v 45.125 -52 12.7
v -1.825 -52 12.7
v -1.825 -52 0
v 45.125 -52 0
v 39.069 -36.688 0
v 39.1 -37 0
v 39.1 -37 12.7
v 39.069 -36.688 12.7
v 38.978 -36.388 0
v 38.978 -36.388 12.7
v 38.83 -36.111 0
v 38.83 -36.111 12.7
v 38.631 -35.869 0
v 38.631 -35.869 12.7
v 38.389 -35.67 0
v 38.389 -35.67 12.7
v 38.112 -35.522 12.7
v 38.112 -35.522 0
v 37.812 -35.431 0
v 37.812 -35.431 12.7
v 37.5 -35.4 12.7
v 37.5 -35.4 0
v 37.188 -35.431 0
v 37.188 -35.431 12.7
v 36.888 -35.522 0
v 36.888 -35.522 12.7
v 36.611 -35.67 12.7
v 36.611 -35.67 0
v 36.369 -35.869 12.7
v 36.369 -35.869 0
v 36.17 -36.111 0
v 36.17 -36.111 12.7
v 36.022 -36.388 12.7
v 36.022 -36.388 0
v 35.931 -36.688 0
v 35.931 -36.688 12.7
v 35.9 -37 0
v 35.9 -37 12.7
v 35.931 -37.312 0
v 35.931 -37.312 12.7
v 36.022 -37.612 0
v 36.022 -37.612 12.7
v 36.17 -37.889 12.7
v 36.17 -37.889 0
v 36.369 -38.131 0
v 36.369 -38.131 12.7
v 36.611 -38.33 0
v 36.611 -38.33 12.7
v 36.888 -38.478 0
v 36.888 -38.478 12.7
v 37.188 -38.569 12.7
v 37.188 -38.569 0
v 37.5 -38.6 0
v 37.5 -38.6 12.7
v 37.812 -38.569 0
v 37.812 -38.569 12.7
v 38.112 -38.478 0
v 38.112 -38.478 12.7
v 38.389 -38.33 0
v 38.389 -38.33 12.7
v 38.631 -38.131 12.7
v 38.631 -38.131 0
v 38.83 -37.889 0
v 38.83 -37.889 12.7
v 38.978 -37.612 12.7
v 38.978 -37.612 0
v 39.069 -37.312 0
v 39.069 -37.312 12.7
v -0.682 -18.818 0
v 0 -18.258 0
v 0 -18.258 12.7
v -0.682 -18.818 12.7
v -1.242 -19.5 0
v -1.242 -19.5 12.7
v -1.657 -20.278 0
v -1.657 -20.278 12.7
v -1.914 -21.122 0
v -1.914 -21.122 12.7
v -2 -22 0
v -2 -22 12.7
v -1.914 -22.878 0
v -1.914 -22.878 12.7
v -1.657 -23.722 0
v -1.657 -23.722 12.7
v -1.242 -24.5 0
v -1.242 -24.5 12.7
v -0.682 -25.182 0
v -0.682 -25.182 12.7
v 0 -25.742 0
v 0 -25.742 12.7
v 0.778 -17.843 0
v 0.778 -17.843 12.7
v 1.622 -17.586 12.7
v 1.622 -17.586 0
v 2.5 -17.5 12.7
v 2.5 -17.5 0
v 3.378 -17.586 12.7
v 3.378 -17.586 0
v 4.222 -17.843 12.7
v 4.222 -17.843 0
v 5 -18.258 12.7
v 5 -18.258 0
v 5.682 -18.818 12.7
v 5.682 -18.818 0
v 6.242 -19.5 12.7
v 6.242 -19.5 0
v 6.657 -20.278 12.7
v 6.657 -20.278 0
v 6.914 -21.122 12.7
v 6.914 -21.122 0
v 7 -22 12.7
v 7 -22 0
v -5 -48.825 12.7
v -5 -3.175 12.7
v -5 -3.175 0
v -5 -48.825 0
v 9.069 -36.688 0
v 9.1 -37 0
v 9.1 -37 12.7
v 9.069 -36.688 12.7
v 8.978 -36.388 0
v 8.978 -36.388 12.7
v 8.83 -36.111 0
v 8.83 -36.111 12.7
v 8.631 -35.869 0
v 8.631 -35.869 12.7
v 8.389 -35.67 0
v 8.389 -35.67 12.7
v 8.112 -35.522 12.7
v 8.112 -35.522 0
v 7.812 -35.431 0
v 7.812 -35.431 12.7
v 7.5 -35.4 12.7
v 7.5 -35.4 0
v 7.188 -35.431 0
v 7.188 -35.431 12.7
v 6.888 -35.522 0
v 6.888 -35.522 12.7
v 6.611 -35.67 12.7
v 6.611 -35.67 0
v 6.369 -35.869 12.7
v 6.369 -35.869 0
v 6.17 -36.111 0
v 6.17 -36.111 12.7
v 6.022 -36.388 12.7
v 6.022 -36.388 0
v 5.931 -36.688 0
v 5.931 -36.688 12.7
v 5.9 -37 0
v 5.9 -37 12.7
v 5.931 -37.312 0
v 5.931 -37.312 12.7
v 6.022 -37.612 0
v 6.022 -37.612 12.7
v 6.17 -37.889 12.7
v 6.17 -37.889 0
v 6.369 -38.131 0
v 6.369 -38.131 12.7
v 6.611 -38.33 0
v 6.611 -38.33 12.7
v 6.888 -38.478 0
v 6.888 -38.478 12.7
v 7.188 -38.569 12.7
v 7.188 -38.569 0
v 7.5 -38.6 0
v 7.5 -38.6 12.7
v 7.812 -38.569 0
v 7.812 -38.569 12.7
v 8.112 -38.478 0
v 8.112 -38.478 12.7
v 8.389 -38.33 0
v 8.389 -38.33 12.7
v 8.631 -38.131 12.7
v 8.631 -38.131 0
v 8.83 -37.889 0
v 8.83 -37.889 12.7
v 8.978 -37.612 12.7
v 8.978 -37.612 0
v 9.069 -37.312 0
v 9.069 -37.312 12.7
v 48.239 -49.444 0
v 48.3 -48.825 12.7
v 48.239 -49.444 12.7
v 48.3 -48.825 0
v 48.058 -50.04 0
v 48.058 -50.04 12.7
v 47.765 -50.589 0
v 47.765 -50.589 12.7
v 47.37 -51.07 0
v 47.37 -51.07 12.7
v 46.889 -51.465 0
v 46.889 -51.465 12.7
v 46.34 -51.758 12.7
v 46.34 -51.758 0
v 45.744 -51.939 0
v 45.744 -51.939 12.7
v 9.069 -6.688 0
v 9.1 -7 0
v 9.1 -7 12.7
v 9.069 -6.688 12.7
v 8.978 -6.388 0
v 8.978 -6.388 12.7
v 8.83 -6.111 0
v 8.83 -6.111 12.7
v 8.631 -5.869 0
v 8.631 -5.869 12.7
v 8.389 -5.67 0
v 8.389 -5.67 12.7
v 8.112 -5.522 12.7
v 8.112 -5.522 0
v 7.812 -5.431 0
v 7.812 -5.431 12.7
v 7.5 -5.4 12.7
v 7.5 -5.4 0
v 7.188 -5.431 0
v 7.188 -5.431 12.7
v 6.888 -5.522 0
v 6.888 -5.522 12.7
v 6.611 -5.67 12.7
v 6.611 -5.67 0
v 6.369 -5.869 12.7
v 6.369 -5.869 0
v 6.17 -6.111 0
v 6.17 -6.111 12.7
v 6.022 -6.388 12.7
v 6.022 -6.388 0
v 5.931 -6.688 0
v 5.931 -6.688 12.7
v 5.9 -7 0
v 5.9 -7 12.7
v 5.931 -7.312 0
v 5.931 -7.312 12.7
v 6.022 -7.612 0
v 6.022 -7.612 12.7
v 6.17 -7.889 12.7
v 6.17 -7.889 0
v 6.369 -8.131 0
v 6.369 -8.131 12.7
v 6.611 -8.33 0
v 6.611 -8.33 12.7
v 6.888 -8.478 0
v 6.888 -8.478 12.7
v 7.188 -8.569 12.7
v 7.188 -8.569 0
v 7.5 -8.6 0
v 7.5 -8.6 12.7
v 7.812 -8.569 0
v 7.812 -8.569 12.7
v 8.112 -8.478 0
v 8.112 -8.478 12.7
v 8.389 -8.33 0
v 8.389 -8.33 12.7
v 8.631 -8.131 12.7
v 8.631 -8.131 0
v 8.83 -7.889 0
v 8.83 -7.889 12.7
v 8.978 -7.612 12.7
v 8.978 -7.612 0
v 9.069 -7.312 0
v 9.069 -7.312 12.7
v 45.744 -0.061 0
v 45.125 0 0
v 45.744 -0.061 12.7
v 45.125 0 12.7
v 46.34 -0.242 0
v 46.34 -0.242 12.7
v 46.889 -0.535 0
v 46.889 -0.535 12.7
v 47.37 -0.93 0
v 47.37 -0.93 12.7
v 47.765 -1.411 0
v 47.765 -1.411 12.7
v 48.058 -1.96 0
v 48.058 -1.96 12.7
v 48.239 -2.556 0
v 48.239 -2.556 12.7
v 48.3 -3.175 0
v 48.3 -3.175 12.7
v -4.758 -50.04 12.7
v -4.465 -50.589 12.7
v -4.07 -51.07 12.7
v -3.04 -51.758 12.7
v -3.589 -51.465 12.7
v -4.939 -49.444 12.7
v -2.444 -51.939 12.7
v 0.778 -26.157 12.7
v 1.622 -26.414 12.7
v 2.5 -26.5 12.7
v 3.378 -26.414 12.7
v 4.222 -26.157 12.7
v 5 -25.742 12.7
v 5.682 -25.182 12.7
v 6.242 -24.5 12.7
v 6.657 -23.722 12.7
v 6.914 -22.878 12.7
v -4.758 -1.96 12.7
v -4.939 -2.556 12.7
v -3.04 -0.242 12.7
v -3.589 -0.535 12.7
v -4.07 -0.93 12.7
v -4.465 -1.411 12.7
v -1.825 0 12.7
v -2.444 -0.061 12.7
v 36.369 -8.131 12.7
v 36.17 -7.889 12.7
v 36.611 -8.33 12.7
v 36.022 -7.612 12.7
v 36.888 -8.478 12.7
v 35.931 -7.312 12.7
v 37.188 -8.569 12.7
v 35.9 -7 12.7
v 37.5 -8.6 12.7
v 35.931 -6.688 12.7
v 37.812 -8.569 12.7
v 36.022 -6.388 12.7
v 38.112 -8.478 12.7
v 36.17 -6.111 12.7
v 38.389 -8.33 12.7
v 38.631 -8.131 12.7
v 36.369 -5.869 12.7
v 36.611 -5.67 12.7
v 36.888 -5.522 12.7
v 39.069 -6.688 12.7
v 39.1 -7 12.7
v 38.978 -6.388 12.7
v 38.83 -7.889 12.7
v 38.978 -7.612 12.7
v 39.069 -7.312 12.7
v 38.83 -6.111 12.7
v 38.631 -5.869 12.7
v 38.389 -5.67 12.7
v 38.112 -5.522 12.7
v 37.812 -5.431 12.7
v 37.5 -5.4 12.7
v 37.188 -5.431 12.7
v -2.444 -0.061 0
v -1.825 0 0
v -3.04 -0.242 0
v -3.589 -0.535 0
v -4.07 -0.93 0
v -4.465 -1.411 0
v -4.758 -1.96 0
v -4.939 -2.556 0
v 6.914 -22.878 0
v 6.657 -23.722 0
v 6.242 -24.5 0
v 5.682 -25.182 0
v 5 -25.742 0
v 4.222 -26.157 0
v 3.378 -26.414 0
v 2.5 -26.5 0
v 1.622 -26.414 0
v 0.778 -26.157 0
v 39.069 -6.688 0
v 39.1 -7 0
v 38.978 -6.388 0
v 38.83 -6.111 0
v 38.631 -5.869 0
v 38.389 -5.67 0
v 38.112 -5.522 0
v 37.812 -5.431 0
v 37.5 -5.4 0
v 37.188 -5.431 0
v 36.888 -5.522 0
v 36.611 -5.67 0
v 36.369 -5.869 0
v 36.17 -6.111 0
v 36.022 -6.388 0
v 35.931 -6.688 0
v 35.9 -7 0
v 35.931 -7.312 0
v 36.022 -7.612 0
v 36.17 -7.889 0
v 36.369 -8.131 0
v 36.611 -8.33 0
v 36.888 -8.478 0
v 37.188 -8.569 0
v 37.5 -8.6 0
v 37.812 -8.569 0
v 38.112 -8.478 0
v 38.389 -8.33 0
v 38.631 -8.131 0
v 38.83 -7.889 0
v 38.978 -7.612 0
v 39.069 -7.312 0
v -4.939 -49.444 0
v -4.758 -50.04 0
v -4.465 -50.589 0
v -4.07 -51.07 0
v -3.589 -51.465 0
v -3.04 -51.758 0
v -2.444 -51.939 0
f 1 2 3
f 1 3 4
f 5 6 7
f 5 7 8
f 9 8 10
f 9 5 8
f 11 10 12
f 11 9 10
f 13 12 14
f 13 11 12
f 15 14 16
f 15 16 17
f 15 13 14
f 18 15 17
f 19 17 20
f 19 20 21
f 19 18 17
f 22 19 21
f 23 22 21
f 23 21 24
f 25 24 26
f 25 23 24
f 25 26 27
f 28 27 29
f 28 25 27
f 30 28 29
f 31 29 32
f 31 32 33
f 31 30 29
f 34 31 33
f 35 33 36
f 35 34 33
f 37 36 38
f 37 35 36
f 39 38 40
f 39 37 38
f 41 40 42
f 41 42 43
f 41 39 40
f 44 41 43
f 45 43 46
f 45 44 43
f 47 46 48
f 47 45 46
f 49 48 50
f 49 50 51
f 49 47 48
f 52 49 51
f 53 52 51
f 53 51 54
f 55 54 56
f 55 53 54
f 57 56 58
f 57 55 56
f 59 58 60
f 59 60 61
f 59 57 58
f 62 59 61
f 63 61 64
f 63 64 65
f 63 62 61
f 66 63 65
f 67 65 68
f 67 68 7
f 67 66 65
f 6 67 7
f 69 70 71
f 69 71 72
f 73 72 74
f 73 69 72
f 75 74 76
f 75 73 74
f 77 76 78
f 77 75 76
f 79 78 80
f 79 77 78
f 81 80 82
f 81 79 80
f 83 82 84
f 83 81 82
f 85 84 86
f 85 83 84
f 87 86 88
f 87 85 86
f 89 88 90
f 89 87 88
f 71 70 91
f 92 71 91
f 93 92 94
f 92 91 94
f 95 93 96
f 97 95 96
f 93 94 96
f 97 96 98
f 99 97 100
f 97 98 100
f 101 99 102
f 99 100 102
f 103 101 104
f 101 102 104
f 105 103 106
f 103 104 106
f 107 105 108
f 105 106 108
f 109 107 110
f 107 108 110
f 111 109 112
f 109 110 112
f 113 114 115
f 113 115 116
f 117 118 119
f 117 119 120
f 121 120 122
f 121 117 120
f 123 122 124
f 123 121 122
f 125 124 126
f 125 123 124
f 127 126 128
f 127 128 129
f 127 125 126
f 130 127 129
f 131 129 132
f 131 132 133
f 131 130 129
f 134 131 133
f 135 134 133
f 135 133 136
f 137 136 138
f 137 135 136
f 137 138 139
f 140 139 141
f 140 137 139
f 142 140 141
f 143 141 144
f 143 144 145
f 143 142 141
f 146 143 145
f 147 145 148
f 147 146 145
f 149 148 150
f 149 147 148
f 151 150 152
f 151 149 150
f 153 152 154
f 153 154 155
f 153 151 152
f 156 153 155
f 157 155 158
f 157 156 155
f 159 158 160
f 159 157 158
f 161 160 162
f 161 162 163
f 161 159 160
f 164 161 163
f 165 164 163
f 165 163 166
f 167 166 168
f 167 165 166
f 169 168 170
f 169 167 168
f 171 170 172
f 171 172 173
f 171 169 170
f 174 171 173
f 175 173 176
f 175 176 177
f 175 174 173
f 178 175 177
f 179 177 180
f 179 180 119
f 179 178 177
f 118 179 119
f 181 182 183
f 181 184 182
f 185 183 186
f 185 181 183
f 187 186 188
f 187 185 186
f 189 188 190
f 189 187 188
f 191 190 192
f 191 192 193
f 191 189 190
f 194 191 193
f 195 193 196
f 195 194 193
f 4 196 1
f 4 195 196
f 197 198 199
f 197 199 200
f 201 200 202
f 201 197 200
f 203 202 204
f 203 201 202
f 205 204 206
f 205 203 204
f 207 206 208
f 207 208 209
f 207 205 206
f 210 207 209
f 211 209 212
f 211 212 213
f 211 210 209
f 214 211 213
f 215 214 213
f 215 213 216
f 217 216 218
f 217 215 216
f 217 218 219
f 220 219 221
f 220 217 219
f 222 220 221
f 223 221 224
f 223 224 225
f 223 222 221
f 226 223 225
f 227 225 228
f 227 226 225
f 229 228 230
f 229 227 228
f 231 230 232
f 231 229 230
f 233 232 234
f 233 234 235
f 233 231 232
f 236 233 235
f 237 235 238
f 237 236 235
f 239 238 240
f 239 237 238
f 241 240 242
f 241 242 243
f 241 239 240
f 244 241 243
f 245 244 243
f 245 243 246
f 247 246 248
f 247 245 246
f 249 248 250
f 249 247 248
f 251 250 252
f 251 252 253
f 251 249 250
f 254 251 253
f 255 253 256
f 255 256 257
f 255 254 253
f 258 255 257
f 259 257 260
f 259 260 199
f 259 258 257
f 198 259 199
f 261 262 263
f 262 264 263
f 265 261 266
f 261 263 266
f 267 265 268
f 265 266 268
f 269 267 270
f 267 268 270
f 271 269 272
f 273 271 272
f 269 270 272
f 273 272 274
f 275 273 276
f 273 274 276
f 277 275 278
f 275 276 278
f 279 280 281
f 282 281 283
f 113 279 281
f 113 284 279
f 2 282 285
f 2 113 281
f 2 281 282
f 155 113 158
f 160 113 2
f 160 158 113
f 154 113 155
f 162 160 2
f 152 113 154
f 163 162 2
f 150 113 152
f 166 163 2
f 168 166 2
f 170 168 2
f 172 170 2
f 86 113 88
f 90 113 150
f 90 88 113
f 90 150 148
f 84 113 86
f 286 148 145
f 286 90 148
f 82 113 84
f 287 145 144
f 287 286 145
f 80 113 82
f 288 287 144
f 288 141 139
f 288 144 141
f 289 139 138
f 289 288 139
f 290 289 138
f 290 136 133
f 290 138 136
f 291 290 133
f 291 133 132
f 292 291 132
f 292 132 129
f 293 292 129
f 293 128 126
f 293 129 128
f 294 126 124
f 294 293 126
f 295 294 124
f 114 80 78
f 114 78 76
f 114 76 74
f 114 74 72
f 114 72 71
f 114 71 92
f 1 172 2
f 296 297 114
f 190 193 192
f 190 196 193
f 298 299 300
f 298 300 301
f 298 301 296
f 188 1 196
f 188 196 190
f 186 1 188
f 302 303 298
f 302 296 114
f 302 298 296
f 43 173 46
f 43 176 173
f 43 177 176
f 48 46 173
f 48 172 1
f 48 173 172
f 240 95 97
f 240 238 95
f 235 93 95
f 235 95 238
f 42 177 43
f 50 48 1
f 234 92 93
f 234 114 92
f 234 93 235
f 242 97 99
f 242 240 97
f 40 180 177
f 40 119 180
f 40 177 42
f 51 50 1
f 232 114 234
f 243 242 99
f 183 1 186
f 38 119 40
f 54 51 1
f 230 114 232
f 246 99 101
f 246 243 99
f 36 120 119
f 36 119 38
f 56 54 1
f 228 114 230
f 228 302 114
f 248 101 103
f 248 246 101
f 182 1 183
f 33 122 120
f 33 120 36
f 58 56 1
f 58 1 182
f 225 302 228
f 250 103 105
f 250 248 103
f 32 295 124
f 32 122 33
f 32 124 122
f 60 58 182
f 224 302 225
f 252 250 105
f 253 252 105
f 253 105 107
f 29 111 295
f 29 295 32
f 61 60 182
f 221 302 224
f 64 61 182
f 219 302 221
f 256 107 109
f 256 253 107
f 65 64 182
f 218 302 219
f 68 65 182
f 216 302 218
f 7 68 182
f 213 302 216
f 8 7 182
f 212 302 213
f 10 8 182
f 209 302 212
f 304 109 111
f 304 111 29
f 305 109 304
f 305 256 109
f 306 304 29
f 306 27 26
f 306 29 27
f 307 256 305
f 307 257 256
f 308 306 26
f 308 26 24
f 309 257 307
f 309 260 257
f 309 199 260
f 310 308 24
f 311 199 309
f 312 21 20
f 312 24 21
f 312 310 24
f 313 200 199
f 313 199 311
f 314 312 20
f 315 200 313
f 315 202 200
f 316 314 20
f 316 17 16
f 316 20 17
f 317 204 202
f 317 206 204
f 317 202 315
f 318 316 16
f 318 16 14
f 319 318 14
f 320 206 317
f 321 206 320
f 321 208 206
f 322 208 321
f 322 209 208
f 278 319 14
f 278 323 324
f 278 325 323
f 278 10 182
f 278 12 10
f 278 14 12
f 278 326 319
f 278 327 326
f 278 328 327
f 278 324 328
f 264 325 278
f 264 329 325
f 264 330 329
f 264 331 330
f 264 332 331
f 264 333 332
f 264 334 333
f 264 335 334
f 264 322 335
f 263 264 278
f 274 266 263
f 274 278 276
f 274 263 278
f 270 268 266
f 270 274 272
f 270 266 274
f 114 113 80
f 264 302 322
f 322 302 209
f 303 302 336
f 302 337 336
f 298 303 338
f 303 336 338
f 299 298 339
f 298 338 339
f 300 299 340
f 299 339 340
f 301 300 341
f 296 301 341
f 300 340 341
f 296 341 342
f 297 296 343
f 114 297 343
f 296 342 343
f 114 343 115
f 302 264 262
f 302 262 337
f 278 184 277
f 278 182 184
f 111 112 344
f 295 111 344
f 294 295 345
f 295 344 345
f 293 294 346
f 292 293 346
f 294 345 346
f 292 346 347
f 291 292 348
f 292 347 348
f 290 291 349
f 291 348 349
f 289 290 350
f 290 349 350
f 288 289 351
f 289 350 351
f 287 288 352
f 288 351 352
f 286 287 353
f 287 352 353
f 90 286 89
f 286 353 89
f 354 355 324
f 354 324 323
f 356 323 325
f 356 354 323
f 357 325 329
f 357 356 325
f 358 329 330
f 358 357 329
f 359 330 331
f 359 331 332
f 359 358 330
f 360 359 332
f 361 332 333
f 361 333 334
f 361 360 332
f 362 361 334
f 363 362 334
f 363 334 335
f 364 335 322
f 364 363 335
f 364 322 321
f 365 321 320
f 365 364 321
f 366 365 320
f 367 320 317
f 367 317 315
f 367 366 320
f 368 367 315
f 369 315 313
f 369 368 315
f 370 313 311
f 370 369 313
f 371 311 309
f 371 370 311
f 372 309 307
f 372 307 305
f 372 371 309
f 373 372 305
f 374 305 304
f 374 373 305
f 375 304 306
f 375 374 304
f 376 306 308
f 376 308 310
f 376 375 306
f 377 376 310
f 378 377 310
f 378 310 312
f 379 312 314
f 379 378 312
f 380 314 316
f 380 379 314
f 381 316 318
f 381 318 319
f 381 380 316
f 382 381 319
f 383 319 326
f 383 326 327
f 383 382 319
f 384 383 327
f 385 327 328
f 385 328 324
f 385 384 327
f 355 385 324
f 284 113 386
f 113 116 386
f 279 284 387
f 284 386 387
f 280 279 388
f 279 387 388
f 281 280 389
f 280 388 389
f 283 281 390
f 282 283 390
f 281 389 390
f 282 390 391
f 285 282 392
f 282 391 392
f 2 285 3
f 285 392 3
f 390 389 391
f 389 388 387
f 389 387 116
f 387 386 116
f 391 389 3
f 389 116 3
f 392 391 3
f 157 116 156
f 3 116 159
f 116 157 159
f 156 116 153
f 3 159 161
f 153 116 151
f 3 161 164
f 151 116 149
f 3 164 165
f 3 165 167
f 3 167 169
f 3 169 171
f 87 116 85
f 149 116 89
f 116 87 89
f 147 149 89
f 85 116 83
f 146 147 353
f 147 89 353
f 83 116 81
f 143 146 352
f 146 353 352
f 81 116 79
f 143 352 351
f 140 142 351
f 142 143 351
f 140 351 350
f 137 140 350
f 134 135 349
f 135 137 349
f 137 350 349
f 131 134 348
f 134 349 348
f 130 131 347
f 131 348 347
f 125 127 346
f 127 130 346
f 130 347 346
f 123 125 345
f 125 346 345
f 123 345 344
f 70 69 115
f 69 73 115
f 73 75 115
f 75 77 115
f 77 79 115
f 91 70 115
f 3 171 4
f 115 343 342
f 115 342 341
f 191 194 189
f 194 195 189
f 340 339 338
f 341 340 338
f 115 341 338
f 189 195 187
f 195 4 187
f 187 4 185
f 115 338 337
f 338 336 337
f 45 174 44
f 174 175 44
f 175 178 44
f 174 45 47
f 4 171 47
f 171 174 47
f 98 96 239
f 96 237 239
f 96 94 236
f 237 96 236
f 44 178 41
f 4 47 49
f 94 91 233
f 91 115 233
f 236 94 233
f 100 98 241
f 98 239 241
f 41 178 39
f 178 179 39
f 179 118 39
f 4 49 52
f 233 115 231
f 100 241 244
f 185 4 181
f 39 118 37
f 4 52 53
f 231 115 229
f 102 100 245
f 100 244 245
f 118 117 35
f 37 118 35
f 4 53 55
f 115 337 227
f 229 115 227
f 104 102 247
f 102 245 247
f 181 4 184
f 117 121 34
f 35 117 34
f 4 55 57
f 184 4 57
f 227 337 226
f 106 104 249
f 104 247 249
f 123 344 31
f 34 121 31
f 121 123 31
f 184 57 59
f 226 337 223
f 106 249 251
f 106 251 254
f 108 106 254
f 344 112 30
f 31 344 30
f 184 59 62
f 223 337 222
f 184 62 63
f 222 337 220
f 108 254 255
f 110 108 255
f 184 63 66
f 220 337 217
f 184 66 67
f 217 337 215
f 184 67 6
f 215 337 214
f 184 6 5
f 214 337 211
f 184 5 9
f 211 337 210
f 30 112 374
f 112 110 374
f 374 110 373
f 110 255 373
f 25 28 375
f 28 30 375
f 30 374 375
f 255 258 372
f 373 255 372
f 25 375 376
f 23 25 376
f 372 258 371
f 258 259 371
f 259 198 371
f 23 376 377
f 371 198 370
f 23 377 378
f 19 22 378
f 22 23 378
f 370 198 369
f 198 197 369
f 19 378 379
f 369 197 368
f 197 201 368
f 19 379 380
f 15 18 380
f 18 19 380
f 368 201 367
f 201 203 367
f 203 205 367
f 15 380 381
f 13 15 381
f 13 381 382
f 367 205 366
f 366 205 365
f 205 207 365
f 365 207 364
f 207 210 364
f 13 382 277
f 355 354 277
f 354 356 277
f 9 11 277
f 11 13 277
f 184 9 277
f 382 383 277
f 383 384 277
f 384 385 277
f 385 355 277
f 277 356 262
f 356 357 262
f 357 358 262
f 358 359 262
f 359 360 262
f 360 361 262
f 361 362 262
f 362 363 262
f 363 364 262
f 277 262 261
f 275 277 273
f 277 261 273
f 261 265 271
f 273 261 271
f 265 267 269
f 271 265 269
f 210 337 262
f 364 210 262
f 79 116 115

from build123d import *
from build123d.topology import SkipClean

# Parameters (mm, degrees)
SKETCH1_R           = 1.6
BOSS_EXTRUDE1_DEPTH = 12.7
SKETCH2_W           = 48.3
SKETCH2_H           = 8
BOSS_EXTRUDE2_DEPTH = 12.7
CUT_EXTRUDE3_DEPTH  = 73.098404975
FILLET1_R           = 3.175


with BuildPart() as part:
    # Sketch1 → Boss-Extrude1 (new body)
    with BuildSketch(Plane.XY):
        with BuildLine():
            Line((48.3, 0), (0, 0))
            Line((0, 0), (0, -18.258342613))
            ThreePointArc((0, -18.258342613), (4.621320344, -18.031373033), (7, -22))
            ThreePointArc((7, -22), (4.621320344, -25.968626967), (0, -25.741657387))
            Line((0, -25.741657387), (0, -44))
            Line((0, -44), (48.3, -44))
            Line((48.3, -44), (48.3, 0))
        make_face()
        with Locations((7.5, -37)):
            Circle(SKETCH1_R, mode=Mode.SUBTRACT)
        with Locations((37.5, -37)):
            Circle(SKETCH1_R, mode=Mode.SUBTRACT)
        with Locations((7.5, -7)):
            Circle(SKETCH1_R, mode=Mode.SUBTRACT)
        with Locations((37.5, -7)):
            Circle(SKETCH1_R, mode=Mode.SUBTRACT)
    extrude(amount=BOSS_EXTRUDE1_DEPTH)

    # Sketch2 → Boss-Extrude2 (add)
    with BuildSketch(Plane.XY.offset(12.7)):
        Polygon((0, -52), (0, -44), (0, -25.741657387), (0, -18.258342613), (0, 0), (-5, 0), (-5, -52), align=None)
        with Locations((24.15, -48)):
            Rectangle(SKETCH2_W, SKETCH2_H)
    extrude(amount=-BOSS_EXTRUDE2_DEPTH)

    # Sketch1<5> → Cut-Extrude3 (cut, through all)
    with SkipClean():  # the faces are left unmerged after this step: merging them gives an invalid solid
        with BuildSketch(Plane.XY):
            with BuildLine():
                ThreePointArc((7, -22), (4.621320344, -18.031373033), (0, -18.258342613))
                Line((0, -18.258342613), (0, -25.741657387))
                ThreePointArc((0, -25.741657387), (4.621320344, -25.968626967), (7, -22))
            make_face()
            with BuildLine():
                Line((0, -25.741657387), (0, -18.258342613))
                ThreePointArc((0, -18.258342613), (-2, -22), (0, -25.741657387))
            make_face()
        extrude(amount=CUT_EXTRUDE3_DEPTH, mode=Mode.SUBTRACT)

    # Fillet1
    fillet1_edges = [part.edges().sort_by_distance(p)[0] for p in [
        (48.3, 0, 6.35),
        (-5, 0, 6.35),
        (48.3, -52, 6.35),
        (-5, -52, 6.35),
    ]]
    fillet(fillet1_edges, radius=FILLET1_R)


solid = part.part
